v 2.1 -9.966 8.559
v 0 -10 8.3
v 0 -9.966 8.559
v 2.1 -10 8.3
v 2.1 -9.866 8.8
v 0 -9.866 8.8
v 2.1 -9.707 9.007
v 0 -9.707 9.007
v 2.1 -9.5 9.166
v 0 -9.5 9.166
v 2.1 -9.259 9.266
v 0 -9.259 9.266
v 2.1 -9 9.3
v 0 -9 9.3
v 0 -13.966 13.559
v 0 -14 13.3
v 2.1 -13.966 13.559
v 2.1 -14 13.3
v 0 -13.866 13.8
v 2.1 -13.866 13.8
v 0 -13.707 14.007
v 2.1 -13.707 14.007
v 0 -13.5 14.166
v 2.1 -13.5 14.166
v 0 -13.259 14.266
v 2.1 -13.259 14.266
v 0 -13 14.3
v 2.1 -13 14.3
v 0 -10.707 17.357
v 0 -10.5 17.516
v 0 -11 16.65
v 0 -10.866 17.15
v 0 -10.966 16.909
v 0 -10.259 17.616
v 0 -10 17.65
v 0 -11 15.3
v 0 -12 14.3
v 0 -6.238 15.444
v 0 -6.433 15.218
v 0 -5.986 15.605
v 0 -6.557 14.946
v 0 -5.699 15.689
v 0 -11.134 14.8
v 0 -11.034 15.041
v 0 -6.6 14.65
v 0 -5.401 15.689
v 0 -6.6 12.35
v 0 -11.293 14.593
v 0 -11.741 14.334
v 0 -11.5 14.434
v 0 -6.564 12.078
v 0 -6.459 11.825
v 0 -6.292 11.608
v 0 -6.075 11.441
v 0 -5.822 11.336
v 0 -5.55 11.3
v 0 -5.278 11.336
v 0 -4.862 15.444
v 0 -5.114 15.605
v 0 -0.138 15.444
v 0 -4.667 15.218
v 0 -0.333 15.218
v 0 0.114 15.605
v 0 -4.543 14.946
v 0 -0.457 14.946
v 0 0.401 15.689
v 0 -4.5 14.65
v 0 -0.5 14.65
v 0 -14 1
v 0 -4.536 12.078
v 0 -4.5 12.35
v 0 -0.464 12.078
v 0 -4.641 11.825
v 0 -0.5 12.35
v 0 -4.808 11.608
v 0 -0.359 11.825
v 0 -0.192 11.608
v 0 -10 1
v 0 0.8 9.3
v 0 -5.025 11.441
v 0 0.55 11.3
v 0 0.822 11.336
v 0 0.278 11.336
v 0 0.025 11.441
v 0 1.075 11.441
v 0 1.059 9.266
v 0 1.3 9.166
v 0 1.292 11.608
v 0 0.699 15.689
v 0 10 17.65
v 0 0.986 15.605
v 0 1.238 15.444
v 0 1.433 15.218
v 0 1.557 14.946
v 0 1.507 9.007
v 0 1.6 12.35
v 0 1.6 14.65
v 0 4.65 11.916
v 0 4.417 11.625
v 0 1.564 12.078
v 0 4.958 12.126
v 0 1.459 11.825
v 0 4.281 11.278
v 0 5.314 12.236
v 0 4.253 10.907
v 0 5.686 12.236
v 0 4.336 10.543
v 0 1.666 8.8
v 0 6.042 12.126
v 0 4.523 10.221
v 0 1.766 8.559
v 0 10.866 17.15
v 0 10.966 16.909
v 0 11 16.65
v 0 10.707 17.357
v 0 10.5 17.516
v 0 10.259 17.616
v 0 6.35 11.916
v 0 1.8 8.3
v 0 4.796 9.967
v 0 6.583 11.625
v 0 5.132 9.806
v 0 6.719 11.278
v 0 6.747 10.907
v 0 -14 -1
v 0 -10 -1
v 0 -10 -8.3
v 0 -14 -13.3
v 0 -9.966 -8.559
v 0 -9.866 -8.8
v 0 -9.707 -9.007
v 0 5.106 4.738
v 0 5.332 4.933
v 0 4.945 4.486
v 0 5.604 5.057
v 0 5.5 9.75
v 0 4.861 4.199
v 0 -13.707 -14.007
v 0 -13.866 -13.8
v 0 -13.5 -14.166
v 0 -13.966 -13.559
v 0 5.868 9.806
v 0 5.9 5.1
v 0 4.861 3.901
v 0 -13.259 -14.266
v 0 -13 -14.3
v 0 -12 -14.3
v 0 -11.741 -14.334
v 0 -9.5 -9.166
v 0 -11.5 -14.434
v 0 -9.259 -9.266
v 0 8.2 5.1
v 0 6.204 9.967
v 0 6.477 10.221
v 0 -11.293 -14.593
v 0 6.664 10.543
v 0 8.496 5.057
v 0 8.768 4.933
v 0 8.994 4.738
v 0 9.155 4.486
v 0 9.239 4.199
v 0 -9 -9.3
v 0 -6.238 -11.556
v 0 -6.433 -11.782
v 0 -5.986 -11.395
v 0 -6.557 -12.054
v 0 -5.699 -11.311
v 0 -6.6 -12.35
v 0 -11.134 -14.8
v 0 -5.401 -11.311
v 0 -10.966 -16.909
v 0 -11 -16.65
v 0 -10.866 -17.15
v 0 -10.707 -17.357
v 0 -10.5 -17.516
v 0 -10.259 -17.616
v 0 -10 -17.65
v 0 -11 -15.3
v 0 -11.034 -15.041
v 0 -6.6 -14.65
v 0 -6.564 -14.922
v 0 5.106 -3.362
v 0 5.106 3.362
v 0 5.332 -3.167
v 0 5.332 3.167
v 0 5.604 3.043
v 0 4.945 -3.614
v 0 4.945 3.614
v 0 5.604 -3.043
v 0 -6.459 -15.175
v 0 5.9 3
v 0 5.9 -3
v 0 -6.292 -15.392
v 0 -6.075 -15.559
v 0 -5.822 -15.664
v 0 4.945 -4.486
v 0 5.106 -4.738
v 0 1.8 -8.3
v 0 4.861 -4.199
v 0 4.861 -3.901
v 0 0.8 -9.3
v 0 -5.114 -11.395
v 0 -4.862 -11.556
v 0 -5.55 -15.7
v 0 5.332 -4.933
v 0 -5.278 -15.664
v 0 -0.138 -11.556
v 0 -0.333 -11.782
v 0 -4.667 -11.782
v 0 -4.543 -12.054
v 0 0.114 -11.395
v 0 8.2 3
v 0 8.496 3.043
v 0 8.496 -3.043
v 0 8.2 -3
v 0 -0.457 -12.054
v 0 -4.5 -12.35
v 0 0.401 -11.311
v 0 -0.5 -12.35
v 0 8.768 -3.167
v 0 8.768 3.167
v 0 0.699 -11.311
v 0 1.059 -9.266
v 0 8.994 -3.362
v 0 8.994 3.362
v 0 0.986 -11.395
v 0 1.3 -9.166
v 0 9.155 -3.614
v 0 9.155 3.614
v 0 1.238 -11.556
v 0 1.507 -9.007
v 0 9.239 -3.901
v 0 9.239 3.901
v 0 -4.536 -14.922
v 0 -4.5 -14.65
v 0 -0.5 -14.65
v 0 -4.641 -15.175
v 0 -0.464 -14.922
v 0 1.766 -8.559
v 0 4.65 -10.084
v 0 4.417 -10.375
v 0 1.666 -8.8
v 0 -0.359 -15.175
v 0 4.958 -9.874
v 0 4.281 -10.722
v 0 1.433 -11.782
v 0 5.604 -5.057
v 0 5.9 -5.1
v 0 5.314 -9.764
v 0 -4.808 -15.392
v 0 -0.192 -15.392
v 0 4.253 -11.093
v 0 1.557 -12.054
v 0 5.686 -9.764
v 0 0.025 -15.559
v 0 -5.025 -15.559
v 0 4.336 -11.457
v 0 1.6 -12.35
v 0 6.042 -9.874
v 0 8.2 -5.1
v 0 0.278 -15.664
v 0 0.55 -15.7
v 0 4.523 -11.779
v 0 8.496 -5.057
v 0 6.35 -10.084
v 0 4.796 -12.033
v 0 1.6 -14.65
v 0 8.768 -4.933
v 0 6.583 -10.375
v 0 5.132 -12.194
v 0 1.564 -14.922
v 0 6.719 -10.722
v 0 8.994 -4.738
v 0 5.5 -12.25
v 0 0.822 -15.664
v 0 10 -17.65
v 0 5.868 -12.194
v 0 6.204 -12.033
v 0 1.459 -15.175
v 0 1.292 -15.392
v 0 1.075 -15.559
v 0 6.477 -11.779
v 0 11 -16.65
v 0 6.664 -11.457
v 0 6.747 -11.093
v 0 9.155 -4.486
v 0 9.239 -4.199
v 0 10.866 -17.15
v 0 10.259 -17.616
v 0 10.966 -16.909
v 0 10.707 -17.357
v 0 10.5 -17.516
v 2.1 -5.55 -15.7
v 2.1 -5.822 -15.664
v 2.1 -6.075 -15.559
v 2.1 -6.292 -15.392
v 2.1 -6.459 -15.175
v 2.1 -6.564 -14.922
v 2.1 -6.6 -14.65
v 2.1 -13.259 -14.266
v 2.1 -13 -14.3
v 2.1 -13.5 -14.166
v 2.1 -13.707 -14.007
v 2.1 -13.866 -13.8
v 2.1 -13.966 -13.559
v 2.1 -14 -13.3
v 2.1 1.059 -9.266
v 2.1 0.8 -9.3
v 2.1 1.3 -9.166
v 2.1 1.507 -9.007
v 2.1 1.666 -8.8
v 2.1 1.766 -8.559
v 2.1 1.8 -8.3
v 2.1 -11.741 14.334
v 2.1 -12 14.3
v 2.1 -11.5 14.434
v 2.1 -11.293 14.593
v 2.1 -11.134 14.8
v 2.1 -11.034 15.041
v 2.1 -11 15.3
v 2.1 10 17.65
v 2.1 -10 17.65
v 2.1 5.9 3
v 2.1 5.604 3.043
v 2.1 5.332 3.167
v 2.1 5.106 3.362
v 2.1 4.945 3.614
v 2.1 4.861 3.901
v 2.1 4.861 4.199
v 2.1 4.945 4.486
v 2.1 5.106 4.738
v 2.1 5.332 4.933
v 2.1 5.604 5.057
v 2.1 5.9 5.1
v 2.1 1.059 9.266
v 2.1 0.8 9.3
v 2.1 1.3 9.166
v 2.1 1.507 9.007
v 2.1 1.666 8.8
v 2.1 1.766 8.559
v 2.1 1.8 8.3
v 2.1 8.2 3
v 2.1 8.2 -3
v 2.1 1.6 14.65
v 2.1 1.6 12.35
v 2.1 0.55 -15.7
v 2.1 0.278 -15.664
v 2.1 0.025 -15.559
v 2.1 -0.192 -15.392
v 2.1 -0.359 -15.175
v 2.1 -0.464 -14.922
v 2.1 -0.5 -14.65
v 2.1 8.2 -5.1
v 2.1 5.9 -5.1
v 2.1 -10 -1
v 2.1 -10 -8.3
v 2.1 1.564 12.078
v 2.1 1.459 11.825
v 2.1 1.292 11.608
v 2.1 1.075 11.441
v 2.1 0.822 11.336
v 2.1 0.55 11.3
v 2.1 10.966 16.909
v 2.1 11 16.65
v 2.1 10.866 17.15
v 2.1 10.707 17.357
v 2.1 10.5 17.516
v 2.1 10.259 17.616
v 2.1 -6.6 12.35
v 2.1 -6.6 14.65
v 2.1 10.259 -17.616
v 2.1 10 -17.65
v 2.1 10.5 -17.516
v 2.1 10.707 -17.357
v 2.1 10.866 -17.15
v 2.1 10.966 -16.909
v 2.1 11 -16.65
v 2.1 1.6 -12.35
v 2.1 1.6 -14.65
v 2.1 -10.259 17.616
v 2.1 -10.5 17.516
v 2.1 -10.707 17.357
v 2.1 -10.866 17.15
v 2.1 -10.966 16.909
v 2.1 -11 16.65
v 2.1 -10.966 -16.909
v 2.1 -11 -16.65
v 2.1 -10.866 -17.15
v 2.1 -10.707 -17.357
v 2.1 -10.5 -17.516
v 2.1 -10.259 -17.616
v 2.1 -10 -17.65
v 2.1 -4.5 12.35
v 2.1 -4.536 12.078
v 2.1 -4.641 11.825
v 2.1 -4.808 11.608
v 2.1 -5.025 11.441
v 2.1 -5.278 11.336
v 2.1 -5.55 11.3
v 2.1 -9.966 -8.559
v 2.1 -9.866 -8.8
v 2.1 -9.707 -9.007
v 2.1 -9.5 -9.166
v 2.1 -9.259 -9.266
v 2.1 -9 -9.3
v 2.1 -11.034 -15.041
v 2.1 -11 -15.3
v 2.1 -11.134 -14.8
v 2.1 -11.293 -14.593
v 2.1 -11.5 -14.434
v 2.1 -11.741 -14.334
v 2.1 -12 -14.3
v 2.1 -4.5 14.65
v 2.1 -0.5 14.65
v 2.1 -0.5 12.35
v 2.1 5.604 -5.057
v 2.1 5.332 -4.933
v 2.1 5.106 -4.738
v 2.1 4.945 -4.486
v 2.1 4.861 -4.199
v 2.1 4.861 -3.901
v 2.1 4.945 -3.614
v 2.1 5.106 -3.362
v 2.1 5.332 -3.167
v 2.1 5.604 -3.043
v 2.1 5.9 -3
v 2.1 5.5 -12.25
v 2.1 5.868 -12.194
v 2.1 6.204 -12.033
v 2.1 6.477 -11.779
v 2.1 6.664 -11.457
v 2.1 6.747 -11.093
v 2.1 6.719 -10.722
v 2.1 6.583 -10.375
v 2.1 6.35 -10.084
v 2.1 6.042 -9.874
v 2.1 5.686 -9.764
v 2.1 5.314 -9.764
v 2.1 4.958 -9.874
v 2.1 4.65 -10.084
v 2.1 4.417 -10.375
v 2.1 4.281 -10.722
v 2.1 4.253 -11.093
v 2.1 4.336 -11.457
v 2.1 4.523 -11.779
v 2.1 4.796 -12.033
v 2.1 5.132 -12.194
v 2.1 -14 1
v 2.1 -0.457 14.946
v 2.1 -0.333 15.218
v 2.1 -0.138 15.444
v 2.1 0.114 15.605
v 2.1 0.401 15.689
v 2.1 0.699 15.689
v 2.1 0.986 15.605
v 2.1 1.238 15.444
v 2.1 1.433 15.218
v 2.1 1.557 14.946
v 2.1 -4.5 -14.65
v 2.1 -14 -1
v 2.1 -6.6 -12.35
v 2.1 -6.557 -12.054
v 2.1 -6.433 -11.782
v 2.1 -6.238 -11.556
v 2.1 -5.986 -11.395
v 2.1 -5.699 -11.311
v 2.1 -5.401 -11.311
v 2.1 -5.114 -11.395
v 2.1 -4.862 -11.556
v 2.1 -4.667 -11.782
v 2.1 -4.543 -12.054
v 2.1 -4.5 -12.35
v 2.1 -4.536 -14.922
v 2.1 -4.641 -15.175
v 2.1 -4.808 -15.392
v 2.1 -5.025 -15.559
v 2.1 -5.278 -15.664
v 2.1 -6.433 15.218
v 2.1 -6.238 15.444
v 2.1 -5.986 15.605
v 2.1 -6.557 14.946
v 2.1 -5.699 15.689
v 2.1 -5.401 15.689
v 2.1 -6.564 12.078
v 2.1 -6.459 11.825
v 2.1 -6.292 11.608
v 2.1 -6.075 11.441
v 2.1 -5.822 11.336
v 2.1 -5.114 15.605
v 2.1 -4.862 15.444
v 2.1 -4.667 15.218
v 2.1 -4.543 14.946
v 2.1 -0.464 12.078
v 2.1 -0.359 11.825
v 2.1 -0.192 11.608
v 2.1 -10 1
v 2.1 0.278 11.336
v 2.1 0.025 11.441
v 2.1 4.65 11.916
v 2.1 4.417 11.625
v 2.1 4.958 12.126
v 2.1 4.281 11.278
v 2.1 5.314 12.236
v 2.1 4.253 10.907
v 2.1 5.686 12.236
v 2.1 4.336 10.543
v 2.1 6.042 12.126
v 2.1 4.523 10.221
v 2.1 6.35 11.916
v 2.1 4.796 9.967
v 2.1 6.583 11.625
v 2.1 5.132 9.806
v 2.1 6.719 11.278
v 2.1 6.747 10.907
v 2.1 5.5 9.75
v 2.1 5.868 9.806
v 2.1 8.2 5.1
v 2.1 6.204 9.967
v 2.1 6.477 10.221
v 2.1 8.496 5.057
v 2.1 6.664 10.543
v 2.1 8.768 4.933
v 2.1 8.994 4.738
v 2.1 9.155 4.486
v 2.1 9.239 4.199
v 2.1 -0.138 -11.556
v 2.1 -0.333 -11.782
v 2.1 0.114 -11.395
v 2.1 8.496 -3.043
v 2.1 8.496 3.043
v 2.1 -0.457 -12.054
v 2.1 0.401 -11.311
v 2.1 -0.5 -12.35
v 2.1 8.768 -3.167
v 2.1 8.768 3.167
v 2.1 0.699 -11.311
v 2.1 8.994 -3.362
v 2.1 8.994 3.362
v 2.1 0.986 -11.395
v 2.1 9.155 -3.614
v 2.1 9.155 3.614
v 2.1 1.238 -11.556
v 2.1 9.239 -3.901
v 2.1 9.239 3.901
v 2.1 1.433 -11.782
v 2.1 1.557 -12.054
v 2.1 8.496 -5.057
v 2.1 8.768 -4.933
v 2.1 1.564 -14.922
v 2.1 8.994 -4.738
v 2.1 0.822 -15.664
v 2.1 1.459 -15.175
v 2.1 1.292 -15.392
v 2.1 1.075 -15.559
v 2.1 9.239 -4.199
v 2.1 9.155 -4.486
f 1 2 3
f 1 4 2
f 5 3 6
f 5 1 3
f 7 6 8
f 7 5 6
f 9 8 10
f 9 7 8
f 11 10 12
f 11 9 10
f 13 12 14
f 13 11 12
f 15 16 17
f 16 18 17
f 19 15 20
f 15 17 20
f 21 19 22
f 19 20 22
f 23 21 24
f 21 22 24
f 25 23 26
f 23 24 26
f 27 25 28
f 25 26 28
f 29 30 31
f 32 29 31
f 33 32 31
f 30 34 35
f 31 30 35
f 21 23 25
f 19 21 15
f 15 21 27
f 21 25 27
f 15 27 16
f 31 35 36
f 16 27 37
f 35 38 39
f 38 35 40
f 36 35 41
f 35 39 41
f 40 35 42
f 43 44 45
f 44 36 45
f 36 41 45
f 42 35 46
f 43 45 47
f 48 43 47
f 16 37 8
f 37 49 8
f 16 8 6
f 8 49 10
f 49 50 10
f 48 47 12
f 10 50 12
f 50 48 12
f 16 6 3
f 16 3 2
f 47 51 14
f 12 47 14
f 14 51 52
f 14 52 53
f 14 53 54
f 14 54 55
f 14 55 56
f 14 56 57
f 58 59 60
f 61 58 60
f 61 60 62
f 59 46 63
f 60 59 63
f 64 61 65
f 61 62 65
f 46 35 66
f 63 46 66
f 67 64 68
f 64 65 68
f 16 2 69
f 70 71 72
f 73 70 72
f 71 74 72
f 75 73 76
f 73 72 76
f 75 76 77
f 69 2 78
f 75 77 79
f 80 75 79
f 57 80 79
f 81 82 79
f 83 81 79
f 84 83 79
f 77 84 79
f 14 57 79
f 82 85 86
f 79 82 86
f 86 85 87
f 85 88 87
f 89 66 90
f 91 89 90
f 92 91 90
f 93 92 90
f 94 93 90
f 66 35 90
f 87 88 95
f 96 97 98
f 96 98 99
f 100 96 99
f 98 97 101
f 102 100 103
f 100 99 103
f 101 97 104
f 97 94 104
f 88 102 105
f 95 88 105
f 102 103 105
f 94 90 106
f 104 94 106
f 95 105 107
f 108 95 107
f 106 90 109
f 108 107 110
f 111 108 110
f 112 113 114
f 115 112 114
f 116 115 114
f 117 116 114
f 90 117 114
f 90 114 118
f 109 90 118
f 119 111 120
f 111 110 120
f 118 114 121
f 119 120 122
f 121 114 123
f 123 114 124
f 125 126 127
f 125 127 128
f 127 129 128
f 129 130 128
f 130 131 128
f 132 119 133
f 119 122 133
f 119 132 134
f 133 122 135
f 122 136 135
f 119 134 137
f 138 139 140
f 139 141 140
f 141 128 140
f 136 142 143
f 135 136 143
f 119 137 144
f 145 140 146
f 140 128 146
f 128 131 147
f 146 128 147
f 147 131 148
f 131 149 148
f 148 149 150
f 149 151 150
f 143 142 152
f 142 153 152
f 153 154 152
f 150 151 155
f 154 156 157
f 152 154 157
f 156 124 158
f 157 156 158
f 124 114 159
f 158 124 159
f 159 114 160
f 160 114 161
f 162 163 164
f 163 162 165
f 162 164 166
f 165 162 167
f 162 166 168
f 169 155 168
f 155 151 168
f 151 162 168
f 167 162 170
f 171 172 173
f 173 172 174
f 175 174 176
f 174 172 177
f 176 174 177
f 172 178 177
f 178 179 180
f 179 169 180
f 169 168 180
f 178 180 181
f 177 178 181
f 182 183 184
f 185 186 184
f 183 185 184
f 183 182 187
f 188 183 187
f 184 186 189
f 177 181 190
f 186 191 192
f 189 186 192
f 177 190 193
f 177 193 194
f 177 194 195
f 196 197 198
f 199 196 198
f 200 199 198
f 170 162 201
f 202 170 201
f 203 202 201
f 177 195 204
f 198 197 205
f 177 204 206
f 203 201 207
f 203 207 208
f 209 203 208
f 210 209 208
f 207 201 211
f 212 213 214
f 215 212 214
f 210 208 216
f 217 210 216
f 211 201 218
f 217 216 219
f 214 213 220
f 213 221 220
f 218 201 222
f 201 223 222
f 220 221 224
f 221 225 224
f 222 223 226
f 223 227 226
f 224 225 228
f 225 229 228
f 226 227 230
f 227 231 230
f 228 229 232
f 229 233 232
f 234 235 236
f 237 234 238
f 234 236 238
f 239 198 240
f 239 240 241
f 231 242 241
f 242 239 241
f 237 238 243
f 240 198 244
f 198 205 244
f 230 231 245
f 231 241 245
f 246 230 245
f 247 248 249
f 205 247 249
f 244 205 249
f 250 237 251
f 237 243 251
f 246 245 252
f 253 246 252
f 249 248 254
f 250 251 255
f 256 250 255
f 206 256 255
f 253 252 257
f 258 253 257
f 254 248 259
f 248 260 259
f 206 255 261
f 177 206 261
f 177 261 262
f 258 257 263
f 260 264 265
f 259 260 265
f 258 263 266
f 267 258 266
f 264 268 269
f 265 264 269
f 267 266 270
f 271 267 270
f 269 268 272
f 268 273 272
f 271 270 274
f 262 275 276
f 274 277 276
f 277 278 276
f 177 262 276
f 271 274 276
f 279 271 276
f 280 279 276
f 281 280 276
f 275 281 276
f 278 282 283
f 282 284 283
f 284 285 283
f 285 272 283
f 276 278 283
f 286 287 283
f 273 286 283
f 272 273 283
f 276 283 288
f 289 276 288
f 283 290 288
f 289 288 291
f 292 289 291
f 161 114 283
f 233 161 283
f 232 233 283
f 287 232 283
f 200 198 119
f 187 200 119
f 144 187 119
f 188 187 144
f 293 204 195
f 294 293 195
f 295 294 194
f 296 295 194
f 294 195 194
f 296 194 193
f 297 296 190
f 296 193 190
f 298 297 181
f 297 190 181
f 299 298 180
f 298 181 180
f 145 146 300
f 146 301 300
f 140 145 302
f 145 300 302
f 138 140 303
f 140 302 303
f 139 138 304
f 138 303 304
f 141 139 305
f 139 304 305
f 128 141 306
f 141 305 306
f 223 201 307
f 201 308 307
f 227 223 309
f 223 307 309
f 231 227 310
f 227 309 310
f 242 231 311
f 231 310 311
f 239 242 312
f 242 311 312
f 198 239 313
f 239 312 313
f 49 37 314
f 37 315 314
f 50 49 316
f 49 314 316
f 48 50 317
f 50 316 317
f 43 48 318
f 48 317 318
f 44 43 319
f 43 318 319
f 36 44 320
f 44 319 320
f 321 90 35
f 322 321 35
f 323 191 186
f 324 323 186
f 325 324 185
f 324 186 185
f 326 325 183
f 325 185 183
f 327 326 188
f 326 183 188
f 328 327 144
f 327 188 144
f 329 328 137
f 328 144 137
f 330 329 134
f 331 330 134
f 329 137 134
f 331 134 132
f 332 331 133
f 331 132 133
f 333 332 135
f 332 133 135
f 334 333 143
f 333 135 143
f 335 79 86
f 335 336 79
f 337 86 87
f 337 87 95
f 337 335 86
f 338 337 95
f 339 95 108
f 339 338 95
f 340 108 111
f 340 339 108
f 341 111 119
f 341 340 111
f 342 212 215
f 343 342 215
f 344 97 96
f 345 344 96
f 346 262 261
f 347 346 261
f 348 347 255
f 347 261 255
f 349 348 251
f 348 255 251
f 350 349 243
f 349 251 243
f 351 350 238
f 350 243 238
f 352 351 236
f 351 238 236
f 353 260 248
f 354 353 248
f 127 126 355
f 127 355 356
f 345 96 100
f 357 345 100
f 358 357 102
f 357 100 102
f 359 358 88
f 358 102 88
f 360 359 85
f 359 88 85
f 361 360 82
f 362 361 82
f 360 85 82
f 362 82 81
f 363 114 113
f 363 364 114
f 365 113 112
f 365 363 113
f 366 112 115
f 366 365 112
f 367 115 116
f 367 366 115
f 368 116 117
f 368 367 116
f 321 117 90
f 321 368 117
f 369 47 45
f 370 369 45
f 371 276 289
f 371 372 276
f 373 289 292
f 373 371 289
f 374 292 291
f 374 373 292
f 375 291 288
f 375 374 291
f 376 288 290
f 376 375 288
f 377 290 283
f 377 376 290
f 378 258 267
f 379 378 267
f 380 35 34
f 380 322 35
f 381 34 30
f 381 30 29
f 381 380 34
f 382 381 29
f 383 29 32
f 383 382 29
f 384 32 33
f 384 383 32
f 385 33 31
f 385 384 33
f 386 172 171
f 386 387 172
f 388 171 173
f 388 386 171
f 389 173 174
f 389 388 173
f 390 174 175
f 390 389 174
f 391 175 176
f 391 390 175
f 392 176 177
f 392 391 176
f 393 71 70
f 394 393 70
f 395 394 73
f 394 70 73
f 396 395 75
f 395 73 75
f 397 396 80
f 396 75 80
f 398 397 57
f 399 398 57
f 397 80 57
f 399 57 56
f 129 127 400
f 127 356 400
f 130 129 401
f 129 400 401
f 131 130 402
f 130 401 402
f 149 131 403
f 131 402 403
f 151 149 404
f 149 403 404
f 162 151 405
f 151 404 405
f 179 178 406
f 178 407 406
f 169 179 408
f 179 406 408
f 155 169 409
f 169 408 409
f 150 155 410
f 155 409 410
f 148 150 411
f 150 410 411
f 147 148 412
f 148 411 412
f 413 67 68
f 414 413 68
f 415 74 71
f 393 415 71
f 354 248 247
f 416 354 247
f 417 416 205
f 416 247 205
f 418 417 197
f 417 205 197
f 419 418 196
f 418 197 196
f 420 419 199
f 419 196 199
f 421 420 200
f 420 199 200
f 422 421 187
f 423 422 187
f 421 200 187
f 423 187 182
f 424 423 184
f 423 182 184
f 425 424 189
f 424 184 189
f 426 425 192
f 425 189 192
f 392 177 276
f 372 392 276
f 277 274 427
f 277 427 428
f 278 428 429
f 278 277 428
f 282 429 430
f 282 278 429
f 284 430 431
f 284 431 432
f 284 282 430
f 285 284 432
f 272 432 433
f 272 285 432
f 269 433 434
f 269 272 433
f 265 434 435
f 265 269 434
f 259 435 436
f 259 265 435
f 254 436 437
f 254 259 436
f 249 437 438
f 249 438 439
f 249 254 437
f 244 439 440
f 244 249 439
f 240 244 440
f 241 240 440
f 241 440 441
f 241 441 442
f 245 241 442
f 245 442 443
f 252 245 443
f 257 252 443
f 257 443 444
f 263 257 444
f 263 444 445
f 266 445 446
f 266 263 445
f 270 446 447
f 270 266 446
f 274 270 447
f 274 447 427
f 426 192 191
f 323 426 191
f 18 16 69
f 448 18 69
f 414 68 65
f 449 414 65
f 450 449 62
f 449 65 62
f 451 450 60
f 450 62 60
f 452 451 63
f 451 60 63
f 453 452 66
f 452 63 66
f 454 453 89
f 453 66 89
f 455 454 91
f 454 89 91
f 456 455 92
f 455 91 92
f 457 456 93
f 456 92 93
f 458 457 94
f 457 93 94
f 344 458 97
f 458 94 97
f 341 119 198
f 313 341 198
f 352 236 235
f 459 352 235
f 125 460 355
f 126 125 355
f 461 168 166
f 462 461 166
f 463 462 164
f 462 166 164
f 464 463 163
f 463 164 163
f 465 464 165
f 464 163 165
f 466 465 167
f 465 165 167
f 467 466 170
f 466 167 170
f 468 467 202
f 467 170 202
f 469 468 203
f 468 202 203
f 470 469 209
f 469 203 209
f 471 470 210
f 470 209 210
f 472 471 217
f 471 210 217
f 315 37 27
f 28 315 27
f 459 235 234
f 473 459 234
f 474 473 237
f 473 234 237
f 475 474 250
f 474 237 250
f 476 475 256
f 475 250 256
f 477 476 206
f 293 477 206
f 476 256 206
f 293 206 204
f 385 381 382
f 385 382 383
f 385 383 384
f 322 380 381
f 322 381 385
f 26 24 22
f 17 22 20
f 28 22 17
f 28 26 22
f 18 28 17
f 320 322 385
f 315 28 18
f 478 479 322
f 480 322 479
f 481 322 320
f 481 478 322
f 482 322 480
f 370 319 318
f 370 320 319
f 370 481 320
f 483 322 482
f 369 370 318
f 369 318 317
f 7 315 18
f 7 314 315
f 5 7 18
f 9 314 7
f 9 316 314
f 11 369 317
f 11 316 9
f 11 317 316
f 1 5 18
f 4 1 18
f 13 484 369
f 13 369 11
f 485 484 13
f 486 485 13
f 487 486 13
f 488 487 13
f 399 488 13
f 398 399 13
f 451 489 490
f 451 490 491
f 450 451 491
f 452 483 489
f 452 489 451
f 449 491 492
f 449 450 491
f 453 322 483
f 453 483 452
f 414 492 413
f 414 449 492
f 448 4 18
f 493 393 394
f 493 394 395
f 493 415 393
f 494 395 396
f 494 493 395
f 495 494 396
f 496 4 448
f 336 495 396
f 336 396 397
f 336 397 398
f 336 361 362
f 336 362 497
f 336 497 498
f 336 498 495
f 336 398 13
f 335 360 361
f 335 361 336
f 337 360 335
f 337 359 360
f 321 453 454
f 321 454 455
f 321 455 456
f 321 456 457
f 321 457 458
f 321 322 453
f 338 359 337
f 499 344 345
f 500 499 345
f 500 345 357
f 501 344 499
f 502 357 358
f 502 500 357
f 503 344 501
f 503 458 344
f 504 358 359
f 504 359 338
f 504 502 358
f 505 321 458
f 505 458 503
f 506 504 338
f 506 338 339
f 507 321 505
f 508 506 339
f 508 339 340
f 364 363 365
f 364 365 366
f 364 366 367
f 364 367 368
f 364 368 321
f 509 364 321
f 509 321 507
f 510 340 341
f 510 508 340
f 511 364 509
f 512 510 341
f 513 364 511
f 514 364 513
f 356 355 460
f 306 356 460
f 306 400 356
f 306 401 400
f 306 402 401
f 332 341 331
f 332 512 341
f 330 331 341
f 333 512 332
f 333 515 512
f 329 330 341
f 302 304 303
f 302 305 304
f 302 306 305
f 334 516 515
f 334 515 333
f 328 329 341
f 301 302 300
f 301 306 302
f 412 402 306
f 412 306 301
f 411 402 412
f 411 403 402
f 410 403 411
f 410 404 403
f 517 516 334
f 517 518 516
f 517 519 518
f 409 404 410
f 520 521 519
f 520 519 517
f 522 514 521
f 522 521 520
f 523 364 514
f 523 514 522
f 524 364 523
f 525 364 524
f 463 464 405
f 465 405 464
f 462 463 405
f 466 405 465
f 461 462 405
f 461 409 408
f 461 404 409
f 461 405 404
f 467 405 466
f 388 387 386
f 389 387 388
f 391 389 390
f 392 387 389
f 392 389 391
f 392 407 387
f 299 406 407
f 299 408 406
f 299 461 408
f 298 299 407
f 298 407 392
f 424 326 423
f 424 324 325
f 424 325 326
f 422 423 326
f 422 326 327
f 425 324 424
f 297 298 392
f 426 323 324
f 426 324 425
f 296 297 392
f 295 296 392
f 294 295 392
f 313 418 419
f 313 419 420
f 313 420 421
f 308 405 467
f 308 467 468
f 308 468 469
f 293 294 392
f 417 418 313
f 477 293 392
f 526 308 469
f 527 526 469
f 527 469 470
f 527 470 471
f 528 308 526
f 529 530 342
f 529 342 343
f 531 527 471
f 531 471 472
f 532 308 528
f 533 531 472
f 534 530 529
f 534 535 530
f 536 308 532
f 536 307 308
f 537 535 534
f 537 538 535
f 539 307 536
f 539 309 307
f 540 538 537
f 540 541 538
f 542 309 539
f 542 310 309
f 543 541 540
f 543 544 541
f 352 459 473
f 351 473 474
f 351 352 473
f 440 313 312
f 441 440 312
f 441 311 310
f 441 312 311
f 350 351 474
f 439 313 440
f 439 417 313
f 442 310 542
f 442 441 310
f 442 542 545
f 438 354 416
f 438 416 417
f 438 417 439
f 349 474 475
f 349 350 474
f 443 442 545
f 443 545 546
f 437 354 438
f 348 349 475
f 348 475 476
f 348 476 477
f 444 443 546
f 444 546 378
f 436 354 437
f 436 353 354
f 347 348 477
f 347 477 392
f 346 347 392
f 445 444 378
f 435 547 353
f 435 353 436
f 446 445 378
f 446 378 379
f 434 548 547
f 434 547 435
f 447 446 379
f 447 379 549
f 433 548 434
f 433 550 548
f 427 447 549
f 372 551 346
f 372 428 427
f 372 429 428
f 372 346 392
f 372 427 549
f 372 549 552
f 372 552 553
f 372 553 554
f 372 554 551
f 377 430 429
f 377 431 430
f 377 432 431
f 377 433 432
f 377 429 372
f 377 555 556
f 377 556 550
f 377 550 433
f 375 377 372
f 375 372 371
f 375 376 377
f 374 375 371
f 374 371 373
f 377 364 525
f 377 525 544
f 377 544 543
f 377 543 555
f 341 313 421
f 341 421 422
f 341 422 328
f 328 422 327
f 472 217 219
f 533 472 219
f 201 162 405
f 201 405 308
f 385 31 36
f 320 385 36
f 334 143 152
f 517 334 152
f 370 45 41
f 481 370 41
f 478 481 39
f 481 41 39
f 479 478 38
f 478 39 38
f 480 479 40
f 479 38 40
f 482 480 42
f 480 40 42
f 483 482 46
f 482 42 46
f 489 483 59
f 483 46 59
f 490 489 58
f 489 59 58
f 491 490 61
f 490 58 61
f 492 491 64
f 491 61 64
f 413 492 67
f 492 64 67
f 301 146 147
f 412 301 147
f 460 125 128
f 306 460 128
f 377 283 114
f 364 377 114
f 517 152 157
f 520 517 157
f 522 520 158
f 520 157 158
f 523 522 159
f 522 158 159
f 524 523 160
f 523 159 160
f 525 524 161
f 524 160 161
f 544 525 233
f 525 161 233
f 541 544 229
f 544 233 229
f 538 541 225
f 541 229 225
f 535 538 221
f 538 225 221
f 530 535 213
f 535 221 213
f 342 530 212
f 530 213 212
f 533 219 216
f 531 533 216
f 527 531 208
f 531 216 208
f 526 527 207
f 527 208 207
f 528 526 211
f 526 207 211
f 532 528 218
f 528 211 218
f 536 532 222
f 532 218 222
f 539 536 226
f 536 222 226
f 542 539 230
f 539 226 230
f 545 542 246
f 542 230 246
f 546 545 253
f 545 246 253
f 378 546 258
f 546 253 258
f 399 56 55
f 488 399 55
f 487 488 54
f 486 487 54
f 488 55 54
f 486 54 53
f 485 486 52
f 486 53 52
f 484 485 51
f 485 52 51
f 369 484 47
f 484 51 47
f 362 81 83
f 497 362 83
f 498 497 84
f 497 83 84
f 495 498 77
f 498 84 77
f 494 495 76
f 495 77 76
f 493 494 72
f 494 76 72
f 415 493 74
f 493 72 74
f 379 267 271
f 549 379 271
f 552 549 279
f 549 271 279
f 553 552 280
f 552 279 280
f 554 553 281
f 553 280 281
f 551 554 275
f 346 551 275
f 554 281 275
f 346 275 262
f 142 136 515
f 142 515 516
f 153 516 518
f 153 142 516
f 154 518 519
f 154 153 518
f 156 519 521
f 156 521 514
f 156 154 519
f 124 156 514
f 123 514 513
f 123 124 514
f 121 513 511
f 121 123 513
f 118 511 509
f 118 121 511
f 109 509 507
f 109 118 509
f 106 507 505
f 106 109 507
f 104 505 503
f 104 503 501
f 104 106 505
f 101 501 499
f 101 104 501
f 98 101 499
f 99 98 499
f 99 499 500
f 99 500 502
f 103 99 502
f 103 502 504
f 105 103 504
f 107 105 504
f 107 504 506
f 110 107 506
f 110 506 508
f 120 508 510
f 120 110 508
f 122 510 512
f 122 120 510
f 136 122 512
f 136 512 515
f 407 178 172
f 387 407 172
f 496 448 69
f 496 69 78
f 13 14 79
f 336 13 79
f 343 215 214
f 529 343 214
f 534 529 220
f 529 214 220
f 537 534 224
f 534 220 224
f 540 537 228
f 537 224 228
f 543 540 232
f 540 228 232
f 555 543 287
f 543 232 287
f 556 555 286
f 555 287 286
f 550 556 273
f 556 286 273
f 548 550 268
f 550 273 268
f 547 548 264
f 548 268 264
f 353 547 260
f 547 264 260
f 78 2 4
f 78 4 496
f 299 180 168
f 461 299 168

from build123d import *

# Parameters (mm, degrees)
SKETCH_1_W          = 18.6
SKETCH_1_H          = 11.8
SKETCH_1_R          = 1.25
EXTRUDE_1_DEPTH     = 2.1
FILLET_1_R          = 1
SKETCH_2_W          = 2
SKETCH_2_H          = 4
CUT_EXTRUDE_1_DEPTH = 10


with BuildPart() as part:
    # 草图1 → 凸台-拉伸1 (new body)
    with BuildSketch(Plane(origin=(0, 0, 0), x_dir=(0, 0, -1), z_dir=(1, 0, 0))):
        Polygon((14.3, -11), (17.65, -11), (17.65, 11), (-17.65, 11), (-17.65, -11), (-14.3, -11), (-14.3, -14), (14.3, -14), align=None)
        with BuildLine():
            ThreePointArc((-11.3, -5.55), (-11.60753788, -6.29246212), (-12.35, -6.6))
            Line((-12.35, -6.6), (-14.65, -6.6))
            ThreePointArc((-14.65, -6.6), (-15.7, -5.55), (-14.65, -4.5))
            Line((-14.65, -4.5), (-14.65, -0.5))
            ThreePointArc((-14.65, -0.5), (-15.7, 0.55), (-14.65, 1.6))
            Line((-14.65, 1.6), (-12.35, 1.6))
            ThreePointArc((-12.35, 1.6), (-11.60753788, 1.29246212), (-11.3, 0.55))
            ThreePointArc((-11.3, 0.55), (-11.60753788, -0.19246212), (-12.35, -0.5))
            Line((-12.35, -0.5), (-12.35, -4.5))
            ThreePointArc((-12.35, -4.5), (-11.60753788, -4.80753788), (-11.3, -5.55))
        make_face(mode=Mode.SUBTRACT)
        with Locations((0, -4.1)):
            Rectangle(SKETCH_1_W, SKETCH_1_H, mode=Mode.SUBTRACT)
        with BuildLine():
            ThreePointArc((15.7, -5.55), (15.39246212, -6.29246212), (14.65, -6.6))
            Line((14.65, -6.6), (12.35, -6.6))
            ThreePointArc((12.35, -6.6), (11.3, -5.55), (12.35, -4.5))
            Line((12.35, -4.5), (12.35, -0.5))
            ThreePointArc((12.35, -0.5), (11.3, 0.55), (12.35, 1.6))
            Line((12.35, 1.6), (14.65, 1.6))
            ThreePointArc((14.65, 1.6), (15.39246212, 1.29246212), (15.7, 0.55))
            ThreePointArc((15.7, 0.55), (15.39246212, -0.19246212), (14.65, -0.5))
            Line((14.65, -0.5), (14.65, -4.5))
            ThreePointArc((14.65, -4.5), (15.39246212, -4.80753788), (15.7, -5.55))
        make_face(mode=Mode.SUBTRACT)
        with Locations((-11, 5.5)):
            Circle(SKETCH_1_R, mode=Mode.SUBTRACT)
        with BuildLine():
            Line((3, 5.9), (-3, 5.9))
            ThreePointArc((-3, 5.9), (-4.05, 4.85), (-5.1, 5.9))
            Line((-5.1, 5.9), (-5.1, 8.2))
            ThreePointArc((-5.1, 8.2), (-4.05, 9.25), (-3, 8.2))
            Line((-3, 8.2), (3, 8.2))
            ThreePointArc((3, 8.2), (4.05, 9.25), (5.1, 8.2))
            Line((5.1, 8.2), (5.1, 5.9))
            ThreePointArc((5.1, 5.9), (4.05, 4.85), (3, 5.9))
        make_face(mode=Mode.SUBTRACT)
        with Locations((11, 5.5)):
            Circle(SKETCH_1_R, mode=Mode.SUBTRACT)
    extrude(amount=EXTRUDE_1_DEPTH)

    # 圆角1
    fillet_1_edges = [part.edges().sort_by_distance(p)[0] for p in [
        (1.05, -11, 17.65),
        (1.05, 11, 17.65),
        (1.05, 11, -17.65),
        (1.05, -11, -17.65),
        (1.05, -11, -14.3),
        (1.05, -14, -14.3),
        (1.05, -14, 14.3),
        (1.05, -11, 14.3),
        (1.05, -10, -9.3),
        (1.05, 1.8, -9.3),
        (1.05, 1.8, 9.3),
        (1.05, -10, 9.3),
    ]]
    fillet(fillet_1_edges, radius=FILLET_1_R)

    # 草图2 → 切除-拉伸1 (cut)
    with BuildSketch(Plane(origin=(2.1, 0, 0), x_dir=(0, 0, -1), z_dir=(1, 0, 0))):
        with Locations((0, -12)):
            Rectangle(SKETCH_2_W, SKETCH_2_H)
    extrude(amount=-CUT_EXTRUDE_1_DEPTH, mode=Mode.SUBTRACT)


solid = part.part
